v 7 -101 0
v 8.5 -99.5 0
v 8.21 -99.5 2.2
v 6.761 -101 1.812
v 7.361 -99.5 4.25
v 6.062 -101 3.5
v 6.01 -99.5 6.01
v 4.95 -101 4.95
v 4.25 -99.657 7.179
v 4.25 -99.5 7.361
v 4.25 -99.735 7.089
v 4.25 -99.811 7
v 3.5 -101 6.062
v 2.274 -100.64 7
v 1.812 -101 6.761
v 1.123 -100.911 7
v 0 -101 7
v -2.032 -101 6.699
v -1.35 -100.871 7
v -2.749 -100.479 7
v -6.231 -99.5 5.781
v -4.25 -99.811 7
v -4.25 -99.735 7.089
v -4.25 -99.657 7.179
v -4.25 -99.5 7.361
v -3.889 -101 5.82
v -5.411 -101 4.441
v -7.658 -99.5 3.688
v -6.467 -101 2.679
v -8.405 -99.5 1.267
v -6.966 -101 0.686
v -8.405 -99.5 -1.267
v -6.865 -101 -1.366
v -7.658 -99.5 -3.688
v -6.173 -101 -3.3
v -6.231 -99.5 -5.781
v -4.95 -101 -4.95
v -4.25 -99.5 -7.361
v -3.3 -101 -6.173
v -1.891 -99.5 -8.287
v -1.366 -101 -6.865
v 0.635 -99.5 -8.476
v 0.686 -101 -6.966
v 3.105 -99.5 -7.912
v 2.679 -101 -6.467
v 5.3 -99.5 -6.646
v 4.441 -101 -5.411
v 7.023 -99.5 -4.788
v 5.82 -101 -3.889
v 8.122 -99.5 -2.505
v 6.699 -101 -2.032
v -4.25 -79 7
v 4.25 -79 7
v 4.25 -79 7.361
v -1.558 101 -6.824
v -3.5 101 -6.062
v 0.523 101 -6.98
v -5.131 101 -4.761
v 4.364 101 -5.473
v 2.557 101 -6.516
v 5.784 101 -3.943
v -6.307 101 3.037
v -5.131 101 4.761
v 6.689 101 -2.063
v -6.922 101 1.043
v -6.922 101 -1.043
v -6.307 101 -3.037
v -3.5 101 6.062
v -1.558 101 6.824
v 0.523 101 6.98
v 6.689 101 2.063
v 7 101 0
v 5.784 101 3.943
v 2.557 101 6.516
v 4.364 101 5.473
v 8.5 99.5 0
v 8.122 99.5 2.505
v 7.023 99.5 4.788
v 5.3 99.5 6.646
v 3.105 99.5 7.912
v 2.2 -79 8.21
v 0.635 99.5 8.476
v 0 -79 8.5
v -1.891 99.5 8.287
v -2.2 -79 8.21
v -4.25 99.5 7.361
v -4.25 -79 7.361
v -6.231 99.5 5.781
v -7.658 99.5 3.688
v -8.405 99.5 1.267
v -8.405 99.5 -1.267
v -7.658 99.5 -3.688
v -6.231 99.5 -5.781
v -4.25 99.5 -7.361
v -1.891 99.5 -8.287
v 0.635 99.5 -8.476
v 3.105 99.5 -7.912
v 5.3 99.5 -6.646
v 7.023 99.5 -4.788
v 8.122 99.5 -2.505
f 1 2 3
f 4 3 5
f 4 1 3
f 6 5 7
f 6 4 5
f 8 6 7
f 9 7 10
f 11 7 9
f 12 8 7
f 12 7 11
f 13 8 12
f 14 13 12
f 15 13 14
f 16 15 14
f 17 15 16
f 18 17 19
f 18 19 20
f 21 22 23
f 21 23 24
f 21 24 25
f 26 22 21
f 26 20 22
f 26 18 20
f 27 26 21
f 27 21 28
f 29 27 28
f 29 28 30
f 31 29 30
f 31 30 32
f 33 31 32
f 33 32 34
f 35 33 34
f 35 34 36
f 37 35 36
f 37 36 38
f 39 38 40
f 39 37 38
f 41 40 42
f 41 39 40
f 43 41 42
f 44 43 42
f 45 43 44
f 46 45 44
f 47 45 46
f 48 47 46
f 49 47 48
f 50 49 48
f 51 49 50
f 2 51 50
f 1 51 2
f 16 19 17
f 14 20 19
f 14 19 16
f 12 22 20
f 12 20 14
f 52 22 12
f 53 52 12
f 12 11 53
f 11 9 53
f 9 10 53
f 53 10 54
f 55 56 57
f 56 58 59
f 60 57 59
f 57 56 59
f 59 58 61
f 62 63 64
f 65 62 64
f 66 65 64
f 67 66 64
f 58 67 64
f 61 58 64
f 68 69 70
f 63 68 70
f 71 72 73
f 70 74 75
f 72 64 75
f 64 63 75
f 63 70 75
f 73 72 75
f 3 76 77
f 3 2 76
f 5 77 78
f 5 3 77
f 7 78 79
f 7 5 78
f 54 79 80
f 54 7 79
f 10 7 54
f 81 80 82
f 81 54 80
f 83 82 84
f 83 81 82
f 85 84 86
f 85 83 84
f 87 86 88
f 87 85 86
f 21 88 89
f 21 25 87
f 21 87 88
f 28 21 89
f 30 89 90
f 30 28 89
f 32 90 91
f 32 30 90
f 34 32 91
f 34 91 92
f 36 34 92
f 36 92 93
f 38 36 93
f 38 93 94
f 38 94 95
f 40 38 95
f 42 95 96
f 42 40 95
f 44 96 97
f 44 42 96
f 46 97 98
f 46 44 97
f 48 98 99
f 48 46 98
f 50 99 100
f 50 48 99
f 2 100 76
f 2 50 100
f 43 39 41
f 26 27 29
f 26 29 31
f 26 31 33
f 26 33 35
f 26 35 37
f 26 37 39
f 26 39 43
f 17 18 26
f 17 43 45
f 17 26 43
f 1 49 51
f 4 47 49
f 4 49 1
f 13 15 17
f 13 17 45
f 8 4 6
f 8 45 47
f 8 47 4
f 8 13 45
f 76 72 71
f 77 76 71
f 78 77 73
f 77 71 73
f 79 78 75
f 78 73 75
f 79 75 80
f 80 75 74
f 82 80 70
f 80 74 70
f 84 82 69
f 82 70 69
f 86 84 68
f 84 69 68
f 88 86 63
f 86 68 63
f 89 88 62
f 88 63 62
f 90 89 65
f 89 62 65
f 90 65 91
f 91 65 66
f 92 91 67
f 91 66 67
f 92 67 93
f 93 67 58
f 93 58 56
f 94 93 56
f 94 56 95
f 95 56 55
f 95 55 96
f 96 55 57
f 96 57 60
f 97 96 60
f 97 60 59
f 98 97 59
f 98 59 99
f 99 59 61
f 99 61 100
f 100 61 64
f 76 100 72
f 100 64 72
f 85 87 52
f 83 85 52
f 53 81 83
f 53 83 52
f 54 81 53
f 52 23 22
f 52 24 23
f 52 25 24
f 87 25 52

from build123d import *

# Parameters (mm, degrees)
F0_R          = 8.5
F1_DEPTH      = 101
F1_DEPTH_BACK = 101
F2_SIZE       = 1.5
F4_W          = 8.5
F4_H          = 22
F5_DEPTH      = 1.5


with BuildPart() as f1:
    # F0 (on Front) → F1 (new body, two sides)
    with BuildSketch(Plane.XZ) as f1_sk:
        Circle(F0_R)
    extrude(amount=F1_DEPTH)
    extrude(f1_sk.sketch, amount=-F1_DEPTH_BACK)

    # F2
    f2_edges = [f1.edges().sort_by_distance(p)[0] for p in [
        (-8.5, -101, 0),
        (-8.5, 101, 0),
    ]]
    chamfer(f2_edges, length=F2_SIZE)

    # F4 (on offset) → F5 (cut)
    with BuildSketch(Plane.XY.offset(8.5)):
        with Locations((0, -90)):
            Rectangle(F4_W, F4_H)
    extrude(amount=-F5_DEPTH, mode=Mode.SUBTRACT)


solid = f1.part
